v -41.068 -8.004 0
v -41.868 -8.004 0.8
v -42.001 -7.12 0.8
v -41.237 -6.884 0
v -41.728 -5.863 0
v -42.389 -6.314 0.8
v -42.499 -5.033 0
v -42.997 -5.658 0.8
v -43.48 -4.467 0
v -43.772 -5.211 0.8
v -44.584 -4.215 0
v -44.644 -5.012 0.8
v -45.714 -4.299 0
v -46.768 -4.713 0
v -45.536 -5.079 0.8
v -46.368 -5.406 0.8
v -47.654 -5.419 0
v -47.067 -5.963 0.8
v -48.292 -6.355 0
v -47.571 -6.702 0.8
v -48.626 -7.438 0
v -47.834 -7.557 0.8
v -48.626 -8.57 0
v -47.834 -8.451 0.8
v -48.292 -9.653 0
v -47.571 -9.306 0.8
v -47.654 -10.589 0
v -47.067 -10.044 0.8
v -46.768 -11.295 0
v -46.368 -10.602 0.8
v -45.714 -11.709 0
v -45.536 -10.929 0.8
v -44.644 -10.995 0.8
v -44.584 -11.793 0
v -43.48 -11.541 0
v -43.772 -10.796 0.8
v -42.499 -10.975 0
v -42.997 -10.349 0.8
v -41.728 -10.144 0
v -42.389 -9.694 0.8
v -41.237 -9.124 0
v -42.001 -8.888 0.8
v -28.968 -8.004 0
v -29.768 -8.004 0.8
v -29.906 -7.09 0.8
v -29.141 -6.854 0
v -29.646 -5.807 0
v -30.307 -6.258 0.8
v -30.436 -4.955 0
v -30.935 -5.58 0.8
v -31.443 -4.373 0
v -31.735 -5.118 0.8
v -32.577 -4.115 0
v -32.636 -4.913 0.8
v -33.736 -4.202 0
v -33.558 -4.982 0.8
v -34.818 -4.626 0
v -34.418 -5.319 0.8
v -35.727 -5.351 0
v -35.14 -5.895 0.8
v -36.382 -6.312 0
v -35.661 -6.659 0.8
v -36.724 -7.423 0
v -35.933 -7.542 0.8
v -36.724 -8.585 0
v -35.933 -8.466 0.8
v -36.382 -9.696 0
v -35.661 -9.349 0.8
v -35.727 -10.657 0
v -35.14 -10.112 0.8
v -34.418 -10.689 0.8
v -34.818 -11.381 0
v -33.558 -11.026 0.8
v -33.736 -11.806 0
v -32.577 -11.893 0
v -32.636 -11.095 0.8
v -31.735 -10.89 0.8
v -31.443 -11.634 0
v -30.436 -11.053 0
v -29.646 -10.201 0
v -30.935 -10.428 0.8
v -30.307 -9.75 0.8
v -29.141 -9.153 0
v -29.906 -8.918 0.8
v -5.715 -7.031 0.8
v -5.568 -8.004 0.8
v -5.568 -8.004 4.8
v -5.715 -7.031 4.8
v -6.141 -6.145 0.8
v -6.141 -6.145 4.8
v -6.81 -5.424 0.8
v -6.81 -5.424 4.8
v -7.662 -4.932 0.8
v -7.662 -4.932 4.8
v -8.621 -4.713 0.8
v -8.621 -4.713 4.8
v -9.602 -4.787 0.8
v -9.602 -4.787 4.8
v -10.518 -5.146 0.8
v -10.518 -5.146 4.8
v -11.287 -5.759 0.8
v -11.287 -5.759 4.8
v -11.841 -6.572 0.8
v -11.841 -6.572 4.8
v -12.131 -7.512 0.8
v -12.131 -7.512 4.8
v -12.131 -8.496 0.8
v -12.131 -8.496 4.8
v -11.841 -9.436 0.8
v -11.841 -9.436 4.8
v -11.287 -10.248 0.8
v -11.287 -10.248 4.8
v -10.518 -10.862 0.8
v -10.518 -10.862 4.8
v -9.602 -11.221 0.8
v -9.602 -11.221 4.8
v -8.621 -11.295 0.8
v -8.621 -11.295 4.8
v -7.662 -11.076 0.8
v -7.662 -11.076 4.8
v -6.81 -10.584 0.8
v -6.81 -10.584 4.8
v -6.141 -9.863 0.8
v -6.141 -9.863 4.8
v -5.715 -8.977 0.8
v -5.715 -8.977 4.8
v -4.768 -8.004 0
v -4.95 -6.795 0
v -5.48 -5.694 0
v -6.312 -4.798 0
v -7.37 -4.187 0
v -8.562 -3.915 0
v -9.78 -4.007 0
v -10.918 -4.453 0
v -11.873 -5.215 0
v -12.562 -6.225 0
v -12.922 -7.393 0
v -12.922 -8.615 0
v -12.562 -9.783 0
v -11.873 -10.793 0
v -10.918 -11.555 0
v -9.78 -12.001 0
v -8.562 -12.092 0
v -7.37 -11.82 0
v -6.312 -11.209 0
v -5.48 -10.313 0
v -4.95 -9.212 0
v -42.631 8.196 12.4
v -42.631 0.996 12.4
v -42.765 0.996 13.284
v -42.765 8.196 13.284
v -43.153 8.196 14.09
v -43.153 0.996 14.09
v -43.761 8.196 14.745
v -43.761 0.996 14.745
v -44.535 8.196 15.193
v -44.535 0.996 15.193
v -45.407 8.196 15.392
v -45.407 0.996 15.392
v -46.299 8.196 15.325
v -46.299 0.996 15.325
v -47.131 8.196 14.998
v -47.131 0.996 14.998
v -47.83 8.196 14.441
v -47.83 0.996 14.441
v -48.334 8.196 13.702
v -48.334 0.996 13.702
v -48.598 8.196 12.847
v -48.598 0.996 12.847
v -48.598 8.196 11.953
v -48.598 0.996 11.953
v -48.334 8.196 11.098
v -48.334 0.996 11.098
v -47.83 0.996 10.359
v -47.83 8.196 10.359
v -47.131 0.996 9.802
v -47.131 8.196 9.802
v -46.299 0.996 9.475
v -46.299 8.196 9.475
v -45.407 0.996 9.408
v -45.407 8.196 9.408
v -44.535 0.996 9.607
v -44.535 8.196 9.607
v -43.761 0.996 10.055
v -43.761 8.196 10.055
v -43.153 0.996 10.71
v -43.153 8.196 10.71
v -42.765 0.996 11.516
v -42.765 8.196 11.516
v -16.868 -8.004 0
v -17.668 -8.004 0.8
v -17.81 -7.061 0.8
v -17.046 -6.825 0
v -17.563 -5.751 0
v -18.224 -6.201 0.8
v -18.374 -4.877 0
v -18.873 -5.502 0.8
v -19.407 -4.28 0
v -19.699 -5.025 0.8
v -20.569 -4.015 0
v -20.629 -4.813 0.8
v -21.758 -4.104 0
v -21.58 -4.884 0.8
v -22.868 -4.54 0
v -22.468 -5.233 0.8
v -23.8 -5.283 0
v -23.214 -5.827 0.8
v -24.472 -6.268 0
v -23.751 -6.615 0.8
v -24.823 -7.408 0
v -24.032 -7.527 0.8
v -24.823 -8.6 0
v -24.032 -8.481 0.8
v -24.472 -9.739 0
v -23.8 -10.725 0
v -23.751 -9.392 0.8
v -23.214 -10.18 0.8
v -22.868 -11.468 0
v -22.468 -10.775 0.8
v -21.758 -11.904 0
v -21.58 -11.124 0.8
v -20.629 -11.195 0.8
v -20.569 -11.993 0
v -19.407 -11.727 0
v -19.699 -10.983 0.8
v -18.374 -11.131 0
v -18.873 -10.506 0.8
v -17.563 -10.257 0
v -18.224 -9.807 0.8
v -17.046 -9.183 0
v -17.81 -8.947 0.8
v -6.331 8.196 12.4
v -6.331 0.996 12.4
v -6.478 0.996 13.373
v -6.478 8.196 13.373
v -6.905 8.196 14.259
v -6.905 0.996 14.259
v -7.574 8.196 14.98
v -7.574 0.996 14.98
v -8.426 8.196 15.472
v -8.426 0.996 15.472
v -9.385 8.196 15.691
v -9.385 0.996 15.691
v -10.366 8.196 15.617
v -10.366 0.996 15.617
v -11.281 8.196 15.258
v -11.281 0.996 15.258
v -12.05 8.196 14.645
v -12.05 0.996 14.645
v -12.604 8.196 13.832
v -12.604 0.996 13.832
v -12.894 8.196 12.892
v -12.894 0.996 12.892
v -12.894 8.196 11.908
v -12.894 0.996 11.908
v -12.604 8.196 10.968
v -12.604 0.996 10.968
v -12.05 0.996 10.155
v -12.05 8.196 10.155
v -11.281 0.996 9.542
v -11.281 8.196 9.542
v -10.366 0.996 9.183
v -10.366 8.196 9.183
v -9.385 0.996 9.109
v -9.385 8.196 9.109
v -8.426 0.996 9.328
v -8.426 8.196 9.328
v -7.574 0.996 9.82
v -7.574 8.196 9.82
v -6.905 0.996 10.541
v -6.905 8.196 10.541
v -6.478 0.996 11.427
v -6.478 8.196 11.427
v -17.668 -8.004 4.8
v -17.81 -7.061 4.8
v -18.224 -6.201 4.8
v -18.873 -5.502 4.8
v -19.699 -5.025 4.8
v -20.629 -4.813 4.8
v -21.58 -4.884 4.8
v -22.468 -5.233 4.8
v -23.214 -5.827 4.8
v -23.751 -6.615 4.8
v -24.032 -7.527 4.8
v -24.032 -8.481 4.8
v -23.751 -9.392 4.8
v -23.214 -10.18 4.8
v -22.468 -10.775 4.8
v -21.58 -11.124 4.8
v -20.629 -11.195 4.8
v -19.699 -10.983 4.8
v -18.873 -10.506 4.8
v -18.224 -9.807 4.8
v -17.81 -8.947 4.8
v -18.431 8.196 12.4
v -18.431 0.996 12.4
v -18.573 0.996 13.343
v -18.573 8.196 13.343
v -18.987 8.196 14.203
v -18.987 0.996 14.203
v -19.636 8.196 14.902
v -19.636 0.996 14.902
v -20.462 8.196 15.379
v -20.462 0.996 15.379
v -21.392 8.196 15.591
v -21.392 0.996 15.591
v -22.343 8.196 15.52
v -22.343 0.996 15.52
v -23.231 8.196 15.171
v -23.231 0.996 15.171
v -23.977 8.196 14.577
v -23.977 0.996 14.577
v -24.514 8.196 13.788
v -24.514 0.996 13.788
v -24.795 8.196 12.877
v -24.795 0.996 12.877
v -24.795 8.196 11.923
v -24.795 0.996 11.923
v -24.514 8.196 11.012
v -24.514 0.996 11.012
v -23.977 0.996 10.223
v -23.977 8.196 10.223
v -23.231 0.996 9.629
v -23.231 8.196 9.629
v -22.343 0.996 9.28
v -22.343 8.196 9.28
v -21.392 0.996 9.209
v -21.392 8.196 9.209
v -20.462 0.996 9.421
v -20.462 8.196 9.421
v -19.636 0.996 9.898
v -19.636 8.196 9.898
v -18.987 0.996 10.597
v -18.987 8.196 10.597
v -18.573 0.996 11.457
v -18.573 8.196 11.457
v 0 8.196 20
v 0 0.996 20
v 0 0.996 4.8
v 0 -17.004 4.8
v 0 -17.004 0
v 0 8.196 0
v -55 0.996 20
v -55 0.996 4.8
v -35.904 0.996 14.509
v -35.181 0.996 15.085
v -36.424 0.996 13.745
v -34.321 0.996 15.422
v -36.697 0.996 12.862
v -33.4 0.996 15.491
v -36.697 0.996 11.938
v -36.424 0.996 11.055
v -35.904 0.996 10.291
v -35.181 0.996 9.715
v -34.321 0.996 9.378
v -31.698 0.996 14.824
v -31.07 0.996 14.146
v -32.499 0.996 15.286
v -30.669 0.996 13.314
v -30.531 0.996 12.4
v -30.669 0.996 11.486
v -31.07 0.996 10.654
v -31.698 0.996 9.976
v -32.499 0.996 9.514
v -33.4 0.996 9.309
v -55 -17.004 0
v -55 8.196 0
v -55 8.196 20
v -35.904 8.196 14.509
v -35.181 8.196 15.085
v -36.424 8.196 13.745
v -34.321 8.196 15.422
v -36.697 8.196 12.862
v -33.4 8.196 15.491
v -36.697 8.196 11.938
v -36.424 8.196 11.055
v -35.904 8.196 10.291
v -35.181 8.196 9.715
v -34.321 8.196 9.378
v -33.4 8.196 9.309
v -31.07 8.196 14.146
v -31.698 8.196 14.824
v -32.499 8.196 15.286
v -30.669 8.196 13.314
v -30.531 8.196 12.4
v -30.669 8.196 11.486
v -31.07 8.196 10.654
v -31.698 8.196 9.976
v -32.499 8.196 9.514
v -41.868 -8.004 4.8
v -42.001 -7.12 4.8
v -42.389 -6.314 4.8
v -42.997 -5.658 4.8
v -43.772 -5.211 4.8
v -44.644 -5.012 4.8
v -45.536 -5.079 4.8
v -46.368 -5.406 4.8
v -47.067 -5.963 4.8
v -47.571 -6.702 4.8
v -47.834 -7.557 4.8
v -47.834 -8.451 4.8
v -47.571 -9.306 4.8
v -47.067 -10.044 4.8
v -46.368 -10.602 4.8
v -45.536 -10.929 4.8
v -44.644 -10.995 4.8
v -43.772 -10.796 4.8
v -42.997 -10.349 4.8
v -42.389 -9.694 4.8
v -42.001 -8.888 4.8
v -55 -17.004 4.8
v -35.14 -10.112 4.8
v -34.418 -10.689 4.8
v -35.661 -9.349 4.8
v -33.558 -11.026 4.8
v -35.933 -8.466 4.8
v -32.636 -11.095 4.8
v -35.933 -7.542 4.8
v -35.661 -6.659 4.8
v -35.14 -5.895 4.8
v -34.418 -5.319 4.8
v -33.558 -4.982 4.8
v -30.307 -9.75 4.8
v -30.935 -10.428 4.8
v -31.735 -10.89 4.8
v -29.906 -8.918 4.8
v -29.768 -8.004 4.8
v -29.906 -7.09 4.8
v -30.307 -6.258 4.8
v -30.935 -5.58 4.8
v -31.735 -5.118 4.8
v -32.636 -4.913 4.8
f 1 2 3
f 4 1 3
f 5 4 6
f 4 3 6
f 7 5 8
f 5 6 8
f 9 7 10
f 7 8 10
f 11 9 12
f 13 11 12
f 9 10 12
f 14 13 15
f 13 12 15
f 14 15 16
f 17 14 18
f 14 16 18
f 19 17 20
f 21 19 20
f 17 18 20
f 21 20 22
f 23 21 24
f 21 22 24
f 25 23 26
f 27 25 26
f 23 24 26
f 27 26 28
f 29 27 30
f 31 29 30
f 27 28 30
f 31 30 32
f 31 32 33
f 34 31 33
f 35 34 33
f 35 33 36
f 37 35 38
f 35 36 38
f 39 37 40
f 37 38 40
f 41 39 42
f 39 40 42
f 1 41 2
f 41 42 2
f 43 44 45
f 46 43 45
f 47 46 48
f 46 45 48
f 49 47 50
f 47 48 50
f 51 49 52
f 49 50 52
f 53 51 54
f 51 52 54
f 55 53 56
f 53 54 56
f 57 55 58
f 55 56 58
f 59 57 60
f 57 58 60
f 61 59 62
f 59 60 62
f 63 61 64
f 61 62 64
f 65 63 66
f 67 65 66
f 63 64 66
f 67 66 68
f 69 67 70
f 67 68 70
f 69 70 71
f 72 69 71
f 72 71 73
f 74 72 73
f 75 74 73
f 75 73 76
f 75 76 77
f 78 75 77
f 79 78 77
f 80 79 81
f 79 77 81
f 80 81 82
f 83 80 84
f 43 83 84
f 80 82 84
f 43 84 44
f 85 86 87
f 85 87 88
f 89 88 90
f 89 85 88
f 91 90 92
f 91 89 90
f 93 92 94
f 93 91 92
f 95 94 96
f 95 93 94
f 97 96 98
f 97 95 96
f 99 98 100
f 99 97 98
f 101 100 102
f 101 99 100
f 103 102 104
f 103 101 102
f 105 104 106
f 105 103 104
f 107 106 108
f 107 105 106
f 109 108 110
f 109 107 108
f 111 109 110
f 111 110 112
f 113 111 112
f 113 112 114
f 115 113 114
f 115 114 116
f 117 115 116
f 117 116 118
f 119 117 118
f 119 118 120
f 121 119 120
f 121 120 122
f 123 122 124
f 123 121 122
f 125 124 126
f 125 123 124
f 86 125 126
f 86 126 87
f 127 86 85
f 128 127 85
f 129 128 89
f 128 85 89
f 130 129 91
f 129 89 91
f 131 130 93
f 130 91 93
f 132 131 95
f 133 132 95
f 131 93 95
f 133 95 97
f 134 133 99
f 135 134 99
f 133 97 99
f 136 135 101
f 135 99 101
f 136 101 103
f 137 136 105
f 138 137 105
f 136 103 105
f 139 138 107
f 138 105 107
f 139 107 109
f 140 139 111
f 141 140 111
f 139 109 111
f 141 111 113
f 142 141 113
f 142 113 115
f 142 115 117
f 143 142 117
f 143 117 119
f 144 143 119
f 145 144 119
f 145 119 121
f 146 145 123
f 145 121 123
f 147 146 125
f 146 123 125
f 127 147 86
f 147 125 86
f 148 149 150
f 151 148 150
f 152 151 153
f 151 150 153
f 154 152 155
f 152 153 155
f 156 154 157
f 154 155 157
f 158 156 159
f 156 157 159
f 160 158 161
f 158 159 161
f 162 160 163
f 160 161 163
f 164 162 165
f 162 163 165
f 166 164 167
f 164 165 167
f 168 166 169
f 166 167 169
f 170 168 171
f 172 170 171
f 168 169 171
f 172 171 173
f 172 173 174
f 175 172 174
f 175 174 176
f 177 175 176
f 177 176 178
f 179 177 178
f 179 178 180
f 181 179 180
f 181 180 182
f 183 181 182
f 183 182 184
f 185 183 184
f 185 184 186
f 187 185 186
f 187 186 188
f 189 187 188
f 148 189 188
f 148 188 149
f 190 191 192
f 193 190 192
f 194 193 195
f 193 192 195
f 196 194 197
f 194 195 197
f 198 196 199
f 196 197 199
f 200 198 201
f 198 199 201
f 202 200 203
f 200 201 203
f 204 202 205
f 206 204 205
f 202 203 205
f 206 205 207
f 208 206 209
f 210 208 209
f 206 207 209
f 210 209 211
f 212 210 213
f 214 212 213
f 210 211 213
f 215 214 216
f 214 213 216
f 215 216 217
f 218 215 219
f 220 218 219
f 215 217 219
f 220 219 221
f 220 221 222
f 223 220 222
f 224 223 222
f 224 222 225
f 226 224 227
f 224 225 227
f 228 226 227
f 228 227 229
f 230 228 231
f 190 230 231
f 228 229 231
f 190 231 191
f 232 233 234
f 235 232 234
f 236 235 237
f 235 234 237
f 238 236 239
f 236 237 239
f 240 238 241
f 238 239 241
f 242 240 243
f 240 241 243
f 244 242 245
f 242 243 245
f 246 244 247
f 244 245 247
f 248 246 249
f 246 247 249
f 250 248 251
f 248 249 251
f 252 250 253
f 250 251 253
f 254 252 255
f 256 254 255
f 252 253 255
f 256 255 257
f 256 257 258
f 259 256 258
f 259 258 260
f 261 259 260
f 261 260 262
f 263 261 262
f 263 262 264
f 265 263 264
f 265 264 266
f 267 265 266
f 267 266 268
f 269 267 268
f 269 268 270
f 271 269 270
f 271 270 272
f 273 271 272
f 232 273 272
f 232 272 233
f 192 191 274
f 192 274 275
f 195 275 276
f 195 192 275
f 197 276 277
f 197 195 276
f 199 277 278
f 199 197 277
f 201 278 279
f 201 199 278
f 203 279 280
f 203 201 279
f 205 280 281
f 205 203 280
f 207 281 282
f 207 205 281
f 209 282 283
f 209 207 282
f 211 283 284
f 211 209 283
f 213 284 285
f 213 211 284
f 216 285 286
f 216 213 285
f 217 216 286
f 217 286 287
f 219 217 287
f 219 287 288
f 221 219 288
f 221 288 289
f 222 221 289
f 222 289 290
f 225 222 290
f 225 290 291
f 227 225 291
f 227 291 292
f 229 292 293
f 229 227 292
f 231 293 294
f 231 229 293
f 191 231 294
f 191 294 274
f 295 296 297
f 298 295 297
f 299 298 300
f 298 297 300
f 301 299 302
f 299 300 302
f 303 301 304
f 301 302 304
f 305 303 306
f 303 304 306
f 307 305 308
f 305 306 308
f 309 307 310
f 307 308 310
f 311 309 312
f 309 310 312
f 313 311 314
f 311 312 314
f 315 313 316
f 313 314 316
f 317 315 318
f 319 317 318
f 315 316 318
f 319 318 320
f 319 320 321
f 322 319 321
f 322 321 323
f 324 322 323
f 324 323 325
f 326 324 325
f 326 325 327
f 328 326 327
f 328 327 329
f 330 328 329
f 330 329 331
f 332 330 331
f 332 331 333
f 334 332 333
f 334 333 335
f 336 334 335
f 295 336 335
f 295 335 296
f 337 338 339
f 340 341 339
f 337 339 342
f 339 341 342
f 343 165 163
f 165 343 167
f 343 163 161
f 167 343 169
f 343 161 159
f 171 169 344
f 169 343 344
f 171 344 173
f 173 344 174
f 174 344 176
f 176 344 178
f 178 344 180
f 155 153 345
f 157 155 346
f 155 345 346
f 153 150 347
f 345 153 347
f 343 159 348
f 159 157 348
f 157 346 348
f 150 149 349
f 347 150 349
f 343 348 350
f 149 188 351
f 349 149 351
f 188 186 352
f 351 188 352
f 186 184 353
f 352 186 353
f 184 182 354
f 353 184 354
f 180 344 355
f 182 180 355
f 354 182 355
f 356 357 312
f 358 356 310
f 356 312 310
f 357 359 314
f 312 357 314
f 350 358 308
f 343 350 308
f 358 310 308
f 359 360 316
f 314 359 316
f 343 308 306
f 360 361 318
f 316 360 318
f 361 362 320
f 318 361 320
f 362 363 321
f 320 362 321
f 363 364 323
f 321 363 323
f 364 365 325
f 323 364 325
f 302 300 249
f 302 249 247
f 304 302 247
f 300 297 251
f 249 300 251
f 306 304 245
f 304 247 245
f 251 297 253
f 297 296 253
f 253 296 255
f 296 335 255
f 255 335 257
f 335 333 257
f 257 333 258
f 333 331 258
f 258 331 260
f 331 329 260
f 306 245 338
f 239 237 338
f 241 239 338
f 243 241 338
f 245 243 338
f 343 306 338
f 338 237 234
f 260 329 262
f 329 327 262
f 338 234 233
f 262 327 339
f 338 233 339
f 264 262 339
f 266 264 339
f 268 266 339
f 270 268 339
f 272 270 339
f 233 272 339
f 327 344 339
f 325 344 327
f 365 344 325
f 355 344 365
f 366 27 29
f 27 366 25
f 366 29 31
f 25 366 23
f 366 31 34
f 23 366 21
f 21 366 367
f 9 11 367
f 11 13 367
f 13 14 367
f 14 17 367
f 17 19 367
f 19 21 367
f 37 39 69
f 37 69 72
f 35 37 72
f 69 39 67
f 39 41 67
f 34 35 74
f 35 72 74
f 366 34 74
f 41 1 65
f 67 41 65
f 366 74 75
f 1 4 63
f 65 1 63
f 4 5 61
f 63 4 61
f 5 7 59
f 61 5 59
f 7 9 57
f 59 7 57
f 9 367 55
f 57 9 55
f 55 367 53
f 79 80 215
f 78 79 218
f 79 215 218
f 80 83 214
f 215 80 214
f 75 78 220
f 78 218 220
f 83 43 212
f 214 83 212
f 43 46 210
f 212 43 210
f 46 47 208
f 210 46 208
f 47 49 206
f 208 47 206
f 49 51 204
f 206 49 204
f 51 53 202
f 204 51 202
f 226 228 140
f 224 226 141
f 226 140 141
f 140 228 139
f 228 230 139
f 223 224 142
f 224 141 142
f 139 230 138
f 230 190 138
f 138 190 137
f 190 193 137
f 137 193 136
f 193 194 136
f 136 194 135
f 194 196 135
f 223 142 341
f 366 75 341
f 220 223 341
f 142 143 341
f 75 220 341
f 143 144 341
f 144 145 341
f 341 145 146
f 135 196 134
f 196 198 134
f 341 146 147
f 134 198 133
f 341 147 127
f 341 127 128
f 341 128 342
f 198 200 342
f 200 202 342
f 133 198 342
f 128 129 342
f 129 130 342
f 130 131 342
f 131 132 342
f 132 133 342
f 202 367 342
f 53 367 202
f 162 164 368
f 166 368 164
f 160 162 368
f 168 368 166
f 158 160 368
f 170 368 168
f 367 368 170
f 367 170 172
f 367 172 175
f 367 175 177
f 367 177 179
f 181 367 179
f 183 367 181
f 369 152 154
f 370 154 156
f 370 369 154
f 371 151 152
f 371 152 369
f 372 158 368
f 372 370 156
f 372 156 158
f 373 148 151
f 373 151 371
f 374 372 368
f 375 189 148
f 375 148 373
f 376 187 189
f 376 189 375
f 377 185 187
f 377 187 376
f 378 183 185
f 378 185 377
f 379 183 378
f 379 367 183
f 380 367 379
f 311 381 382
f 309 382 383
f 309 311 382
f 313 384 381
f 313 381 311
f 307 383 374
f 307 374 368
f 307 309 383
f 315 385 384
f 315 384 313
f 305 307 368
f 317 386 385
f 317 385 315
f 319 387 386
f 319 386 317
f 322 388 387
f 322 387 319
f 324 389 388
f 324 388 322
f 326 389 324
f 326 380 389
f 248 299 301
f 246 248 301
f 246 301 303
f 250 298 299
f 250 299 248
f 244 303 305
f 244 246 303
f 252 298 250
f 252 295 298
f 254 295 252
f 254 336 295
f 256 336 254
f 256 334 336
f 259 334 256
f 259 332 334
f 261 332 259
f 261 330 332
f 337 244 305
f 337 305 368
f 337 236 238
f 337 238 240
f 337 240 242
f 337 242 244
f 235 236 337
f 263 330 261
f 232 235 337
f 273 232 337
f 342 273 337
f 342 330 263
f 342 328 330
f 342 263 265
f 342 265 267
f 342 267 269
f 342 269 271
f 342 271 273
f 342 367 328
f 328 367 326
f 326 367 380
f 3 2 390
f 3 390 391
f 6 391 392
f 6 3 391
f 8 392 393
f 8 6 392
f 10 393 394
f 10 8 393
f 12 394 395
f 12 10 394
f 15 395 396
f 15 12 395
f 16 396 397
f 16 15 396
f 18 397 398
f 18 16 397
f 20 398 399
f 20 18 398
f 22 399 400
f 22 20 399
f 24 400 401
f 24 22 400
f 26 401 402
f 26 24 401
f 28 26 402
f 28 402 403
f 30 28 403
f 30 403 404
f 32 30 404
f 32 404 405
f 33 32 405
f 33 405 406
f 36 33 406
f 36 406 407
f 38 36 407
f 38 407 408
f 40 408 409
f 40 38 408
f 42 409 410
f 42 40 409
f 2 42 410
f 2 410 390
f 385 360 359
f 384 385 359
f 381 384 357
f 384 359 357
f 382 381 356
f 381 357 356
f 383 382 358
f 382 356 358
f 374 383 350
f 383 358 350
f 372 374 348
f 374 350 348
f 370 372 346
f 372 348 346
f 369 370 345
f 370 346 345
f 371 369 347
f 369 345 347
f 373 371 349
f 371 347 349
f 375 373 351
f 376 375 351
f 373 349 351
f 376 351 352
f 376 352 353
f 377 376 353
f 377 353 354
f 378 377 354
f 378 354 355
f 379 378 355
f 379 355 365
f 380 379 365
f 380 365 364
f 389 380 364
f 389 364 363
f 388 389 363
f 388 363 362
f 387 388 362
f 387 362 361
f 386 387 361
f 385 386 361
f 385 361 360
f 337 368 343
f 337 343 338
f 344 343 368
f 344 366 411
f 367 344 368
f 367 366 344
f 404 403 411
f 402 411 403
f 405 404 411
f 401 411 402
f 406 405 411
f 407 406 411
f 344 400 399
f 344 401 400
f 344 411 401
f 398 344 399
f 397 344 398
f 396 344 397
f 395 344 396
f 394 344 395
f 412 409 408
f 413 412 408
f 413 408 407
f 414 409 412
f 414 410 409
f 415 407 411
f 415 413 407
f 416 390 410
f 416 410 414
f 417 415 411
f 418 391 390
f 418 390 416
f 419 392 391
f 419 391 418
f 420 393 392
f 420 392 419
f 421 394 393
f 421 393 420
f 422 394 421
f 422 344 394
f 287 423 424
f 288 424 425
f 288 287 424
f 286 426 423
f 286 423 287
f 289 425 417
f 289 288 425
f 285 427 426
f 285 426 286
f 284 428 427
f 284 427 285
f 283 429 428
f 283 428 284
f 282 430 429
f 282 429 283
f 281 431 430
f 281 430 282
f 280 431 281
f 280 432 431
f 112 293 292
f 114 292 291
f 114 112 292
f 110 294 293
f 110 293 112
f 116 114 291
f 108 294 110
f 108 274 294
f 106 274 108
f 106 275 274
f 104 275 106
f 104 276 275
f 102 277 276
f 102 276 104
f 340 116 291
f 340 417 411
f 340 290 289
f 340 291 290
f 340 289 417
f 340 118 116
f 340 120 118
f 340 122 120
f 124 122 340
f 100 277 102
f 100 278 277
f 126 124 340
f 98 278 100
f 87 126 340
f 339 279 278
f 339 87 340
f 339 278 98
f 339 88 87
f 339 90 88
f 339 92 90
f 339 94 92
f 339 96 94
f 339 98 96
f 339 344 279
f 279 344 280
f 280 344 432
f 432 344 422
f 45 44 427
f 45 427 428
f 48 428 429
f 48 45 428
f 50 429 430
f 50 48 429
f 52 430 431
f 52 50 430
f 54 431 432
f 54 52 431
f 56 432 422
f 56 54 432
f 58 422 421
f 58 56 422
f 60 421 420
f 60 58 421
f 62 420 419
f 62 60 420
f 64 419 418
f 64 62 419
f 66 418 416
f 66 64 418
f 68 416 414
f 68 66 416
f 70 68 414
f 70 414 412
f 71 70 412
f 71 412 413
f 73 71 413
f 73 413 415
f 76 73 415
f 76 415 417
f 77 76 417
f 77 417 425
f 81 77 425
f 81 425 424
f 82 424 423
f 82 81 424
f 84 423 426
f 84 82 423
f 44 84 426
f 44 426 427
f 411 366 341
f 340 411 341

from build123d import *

# Parameters (mm, degrees)
F0_W     = 55
F0_H     = 18
F0_R     = 3
F0_R_2   = 3.1
F0_R_3   = 3.2
F0_R_4   = 3.3
F1_DEPTH = 4.8
F0_H_2   = 7.2
F2_DEPTH = 20
F3_R     = 3
F3_R_2   = 3.1
F3_R_3   = 3.2
F3_R_4   = 3.3
F4_DEPTH = 25
F5_SIZE  = 0.8


with BuildPart() as f1:
    # F0 (on Top) → F1 (new body)
    with BuildSketch(Plane.XY):
        with Locations((-27.5, -8.003877)):
            Rectangle(F0_W, F0_H)
        with Locations((-44.867948, -8.003877)):
            Circle(F0_R, mode=Mode.SUBTRACT)
        with Locations((-32.867948, -8.003877)):
            Circle(F0_R_2, mode=Mode.SUBTRACT)
        with Locations((-20.867948, -8.003877)):
            Circle(F0_R_3, mode=Mode.SUBTRACT)
        with Locations((-8.867948, -8.003877)):
            Circle(F0_R_4, mode=Mode.SUBTRACT)
    extrude(amount=F1_DEPTH)

    # F0 (on Top) → F2 (join)
    with BuildSketch(Plane.XY):
        with Locations((-27.5, 4.596123)):
            Rectangle(F0_W, F0_H_2)
    extrude(amount=F2_DEPTH)

    # F3 (on face) → F4 (cut)
    with BuildSketch(Plane.XZ.offset(-0.996123)):
        with Locations((-45.631237, 12.4)):
            Circle(F3_R)
        with Locations((-33.631237, 12.4)):
            Circle(F3_R_2)
        with Locations((-21.631237, 12.4)):
            Circle(F3_R_3)
        with Locations((-9.631237, 12.4)):
            Circle(F3_R_4)
    extrude(amount=-F4_DEPTH, mode=Mode.SUBTRACT)

    # F5
    f5_edges = [f1.edges().sort_by_distance(p)[0] for p in [
        (-47.867948, -8.003877, 0),
        (-35.967948, -8.003877, 0),
        (-24.067948, -8.003877, 0),
        (-12.167948, -8.003877, 0),
    ]]
    chamfer(f5_edges, length=F5_SIZE)


solid = f1.part
